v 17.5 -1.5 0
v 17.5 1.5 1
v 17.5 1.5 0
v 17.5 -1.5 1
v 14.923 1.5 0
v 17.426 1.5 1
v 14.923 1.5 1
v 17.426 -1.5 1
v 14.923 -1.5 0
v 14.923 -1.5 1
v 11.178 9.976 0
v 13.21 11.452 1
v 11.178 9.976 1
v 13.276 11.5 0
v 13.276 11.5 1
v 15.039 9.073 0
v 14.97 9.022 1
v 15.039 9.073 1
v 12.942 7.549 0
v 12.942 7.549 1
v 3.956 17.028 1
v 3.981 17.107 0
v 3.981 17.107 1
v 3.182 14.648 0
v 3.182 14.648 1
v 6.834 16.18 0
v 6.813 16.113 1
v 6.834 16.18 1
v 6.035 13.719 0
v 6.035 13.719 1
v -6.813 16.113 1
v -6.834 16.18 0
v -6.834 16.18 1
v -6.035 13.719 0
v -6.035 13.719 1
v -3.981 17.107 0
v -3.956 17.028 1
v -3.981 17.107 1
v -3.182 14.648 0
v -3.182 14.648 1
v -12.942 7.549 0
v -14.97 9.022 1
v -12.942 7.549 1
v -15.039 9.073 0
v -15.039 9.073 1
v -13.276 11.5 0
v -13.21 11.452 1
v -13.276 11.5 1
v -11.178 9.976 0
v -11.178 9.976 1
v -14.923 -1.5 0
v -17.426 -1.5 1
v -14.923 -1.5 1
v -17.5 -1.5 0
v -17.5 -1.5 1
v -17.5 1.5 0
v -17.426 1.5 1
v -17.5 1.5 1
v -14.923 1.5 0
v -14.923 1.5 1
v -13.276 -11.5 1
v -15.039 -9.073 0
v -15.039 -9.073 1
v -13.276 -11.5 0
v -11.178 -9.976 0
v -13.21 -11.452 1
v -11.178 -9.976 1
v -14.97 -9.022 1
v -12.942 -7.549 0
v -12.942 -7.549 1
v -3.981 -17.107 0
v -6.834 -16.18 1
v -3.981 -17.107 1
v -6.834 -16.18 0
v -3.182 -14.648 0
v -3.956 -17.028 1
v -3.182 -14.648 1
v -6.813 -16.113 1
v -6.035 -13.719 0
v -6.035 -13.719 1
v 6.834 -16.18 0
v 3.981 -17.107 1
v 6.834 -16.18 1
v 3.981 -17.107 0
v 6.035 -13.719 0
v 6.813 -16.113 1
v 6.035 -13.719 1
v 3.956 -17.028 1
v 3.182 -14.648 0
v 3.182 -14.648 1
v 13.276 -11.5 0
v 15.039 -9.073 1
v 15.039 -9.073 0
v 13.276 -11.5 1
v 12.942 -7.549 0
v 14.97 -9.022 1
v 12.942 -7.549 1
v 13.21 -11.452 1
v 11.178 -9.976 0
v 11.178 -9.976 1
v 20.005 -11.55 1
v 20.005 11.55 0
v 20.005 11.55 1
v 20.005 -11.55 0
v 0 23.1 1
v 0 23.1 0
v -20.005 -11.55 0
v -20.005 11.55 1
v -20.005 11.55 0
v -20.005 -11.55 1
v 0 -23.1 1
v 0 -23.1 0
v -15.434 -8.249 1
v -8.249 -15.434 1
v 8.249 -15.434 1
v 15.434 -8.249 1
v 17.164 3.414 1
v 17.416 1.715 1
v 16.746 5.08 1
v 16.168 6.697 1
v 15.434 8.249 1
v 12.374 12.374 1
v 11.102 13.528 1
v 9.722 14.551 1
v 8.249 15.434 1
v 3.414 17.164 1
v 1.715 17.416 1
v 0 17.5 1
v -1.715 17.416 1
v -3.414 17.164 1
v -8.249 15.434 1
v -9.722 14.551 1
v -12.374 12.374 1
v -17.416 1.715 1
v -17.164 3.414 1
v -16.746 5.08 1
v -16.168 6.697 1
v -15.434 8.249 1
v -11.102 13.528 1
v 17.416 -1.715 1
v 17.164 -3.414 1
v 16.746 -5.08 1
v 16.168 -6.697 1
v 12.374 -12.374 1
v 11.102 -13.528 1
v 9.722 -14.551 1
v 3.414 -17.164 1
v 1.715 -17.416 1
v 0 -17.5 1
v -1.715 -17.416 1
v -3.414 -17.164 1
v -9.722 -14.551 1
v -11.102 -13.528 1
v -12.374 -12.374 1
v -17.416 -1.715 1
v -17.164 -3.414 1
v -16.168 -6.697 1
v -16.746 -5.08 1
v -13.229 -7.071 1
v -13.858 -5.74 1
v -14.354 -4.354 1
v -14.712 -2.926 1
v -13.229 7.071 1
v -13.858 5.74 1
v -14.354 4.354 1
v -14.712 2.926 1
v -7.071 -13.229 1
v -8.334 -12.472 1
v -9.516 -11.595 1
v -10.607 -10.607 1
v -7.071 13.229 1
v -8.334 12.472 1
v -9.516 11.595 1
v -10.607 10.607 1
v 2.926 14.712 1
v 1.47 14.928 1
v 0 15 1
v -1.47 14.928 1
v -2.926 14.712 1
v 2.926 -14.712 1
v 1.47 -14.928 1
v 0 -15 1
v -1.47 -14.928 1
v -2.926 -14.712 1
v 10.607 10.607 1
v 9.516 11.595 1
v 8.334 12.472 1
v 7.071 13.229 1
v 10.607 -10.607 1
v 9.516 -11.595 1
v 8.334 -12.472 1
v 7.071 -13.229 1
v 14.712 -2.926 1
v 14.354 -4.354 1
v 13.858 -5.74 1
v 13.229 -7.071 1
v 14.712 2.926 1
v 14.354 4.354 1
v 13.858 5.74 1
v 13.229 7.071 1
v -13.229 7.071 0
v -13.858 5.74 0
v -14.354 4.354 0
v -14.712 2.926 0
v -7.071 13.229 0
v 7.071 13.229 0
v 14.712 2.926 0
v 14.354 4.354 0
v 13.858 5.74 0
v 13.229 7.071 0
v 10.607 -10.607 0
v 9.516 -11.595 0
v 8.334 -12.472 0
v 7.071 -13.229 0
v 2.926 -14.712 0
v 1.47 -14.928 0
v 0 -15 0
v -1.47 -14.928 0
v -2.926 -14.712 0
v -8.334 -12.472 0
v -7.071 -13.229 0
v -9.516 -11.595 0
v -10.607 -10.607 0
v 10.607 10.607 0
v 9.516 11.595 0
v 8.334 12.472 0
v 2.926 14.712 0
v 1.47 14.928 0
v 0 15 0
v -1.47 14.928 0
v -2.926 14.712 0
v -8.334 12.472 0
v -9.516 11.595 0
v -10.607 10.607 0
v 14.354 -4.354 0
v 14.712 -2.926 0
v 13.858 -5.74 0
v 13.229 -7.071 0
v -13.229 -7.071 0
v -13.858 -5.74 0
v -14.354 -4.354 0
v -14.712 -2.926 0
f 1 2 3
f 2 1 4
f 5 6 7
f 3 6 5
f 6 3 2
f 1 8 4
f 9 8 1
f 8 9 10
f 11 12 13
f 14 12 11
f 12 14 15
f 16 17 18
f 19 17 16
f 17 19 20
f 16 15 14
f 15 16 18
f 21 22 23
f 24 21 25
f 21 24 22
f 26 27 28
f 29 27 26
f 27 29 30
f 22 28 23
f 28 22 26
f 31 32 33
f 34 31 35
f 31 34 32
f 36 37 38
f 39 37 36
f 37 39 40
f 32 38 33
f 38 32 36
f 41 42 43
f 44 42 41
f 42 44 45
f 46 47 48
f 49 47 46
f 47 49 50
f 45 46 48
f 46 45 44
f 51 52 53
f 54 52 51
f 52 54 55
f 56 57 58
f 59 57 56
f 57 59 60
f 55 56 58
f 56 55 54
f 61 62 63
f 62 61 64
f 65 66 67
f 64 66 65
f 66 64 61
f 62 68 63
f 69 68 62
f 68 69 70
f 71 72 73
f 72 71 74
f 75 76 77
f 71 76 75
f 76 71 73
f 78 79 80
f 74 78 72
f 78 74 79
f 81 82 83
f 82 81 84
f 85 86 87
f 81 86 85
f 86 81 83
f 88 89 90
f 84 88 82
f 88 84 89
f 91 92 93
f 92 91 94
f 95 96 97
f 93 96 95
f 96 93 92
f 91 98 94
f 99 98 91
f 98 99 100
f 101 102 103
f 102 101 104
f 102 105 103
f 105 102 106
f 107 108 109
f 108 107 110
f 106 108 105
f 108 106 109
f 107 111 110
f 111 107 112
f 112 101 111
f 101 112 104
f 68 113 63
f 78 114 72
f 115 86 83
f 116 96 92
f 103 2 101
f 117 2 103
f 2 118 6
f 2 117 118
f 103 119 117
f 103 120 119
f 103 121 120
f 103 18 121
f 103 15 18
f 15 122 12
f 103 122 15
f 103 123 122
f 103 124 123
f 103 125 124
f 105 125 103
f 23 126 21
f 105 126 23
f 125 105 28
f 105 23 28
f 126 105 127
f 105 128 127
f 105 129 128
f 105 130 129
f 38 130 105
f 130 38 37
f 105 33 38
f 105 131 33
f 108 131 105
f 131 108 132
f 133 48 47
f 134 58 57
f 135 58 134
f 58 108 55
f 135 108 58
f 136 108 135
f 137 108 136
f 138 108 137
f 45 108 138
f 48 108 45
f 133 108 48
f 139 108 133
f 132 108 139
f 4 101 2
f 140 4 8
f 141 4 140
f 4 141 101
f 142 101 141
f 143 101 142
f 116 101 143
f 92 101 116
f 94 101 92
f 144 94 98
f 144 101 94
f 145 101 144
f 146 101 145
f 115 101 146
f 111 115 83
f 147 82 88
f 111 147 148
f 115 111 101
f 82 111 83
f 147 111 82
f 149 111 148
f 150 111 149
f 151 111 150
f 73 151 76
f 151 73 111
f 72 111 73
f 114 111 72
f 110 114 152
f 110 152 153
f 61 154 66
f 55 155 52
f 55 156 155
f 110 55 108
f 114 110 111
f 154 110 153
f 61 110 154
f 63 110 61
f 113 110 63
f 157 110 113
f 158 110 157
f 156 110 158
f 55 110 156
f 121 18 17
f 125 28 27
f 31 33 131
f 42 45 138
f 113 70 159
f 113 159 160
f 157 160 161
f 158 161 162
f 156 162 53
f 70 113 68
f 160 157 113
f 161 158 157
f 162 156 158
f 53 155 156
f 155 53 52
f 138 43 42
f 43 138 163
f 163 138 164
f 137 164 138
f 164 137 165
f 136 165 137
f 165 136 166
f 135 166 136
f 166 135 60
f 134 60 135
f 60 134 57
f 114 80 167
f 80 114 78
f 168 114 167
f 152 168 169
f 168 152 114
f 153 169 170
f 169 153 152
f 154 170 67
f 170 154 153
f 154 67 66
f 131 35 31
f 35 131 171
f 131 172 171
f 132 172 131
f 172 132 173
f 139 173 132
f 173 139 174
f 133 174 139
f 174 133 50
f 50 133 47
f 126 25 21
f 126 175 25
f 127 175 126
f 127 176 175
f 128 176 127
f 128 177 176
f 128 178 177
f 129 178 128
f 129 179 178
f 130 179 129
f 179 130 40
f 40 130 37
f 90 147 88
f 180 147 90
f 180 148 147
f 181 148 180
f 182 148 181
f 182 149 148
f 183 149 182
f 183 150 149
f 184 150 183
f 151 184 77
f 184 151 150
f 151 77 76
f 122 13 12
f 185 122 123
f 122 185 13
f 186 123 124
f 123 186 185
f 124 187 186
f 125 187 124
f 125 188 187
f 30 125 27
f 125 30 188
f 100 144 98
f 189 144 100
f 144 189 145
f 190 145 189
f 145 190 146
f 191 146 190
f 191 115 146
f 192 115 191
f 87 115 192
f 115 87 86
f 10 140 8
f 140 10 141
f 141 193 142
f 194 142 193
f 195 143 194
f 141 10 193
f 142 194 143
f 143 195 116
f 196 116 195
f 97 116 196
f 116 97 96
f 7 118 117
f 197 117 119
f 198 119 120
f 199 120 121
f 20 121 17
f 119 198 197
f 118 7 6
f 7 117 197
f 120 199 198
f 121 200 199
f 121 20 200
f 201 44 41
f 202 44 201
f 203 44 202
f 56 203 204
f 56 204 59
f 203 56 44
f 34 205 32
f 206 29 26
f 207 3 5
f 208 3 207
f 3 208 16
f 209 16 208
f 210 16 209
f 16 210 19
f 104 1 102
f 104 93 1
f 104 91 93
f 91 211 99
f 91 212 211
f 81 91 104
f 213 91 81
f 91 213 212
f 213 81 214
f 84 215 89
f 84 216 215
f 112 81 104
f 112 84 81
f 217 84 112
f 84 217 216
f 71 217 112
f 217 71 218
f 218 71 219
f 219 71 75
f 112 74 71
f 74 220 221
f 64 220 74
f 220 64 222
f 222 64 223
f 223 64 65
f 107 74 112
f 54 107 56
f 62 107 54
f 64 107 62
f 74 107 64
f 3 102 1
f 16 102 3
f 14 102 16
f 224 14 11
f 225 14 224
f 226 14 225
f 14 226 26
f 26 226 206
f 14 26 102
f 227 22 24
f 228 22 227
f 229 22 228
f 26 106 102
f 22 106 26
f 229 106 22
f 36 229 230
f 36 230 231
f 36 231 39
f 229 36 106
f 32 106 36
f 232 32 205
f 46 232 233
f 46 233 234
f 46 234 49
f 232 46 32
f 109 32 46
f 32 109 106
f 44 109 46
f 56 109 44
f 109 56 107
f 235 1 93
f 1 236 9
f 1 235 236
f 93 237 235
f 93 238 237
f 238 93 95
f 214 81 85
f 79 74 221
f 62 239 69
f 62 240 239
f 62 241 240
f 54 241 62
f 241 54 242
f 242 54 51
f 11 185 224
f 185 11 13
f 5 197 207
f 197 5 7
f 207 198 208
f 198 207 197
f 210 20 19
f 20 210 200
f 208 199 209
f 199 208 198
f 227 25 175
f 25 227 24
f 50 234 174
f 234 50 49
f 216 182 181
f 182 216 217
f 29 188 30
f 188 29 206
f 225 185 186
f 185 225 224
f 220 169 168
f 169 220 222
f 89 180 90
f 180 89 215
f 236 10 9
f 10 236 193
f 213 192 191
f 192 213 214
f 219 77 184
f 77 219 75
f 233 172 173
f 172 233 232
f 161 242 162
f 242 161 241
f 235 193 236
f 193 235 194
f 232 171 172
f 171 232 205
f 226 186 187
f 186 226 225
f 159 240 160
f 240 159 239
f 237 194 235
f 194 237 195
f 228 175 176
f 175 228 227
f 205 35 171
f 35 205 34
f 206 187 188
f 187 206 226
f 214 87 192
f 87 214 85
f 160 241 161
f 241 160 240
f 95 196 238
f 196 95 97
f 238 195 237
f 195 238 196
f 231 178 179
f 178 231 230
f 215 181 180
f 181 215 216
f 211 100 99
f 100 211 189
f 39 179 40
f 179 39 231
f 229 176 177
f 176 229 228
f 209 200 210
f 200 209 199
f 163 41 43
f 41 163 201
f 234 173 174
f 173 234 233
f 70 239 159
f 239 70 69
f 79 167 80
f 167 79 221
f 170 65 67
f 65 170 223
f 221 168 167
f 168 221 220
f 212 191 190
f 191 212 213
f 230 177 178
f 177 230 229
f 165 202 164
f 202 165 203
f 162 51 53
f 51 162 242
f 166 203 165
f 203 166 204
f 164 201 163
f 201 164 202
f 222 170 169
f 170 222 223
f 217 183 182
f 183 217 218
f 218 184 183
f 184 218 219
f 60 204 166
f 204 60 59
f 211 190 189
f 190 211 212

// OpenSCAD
module hexagonal_ring() {
    difference() {
        // Outer hexagonal shape
        scale([1, 1, 0.1])
            rotate([0, 0, 90])
                cylinder(d=46.2, h=10, $fn=6);
        
        // Central circular through-opening
        translate([0, 0, -1])
            cylinder(d=30, h=12, $fn=64);
        
        // Recessed inner annulus
        translate([0, 0, 1])
            cylinder(d=35, h=8, $fn=64);
        
        // Rectangular lugs/teeth
        for (i = [0 : 9]) {
            rotate([0, 0, i * 36])
                translate([15, 0, -1])
                    cube([5, 3, 12], center=true);
        }
    }
}

hexagonal_ring();
